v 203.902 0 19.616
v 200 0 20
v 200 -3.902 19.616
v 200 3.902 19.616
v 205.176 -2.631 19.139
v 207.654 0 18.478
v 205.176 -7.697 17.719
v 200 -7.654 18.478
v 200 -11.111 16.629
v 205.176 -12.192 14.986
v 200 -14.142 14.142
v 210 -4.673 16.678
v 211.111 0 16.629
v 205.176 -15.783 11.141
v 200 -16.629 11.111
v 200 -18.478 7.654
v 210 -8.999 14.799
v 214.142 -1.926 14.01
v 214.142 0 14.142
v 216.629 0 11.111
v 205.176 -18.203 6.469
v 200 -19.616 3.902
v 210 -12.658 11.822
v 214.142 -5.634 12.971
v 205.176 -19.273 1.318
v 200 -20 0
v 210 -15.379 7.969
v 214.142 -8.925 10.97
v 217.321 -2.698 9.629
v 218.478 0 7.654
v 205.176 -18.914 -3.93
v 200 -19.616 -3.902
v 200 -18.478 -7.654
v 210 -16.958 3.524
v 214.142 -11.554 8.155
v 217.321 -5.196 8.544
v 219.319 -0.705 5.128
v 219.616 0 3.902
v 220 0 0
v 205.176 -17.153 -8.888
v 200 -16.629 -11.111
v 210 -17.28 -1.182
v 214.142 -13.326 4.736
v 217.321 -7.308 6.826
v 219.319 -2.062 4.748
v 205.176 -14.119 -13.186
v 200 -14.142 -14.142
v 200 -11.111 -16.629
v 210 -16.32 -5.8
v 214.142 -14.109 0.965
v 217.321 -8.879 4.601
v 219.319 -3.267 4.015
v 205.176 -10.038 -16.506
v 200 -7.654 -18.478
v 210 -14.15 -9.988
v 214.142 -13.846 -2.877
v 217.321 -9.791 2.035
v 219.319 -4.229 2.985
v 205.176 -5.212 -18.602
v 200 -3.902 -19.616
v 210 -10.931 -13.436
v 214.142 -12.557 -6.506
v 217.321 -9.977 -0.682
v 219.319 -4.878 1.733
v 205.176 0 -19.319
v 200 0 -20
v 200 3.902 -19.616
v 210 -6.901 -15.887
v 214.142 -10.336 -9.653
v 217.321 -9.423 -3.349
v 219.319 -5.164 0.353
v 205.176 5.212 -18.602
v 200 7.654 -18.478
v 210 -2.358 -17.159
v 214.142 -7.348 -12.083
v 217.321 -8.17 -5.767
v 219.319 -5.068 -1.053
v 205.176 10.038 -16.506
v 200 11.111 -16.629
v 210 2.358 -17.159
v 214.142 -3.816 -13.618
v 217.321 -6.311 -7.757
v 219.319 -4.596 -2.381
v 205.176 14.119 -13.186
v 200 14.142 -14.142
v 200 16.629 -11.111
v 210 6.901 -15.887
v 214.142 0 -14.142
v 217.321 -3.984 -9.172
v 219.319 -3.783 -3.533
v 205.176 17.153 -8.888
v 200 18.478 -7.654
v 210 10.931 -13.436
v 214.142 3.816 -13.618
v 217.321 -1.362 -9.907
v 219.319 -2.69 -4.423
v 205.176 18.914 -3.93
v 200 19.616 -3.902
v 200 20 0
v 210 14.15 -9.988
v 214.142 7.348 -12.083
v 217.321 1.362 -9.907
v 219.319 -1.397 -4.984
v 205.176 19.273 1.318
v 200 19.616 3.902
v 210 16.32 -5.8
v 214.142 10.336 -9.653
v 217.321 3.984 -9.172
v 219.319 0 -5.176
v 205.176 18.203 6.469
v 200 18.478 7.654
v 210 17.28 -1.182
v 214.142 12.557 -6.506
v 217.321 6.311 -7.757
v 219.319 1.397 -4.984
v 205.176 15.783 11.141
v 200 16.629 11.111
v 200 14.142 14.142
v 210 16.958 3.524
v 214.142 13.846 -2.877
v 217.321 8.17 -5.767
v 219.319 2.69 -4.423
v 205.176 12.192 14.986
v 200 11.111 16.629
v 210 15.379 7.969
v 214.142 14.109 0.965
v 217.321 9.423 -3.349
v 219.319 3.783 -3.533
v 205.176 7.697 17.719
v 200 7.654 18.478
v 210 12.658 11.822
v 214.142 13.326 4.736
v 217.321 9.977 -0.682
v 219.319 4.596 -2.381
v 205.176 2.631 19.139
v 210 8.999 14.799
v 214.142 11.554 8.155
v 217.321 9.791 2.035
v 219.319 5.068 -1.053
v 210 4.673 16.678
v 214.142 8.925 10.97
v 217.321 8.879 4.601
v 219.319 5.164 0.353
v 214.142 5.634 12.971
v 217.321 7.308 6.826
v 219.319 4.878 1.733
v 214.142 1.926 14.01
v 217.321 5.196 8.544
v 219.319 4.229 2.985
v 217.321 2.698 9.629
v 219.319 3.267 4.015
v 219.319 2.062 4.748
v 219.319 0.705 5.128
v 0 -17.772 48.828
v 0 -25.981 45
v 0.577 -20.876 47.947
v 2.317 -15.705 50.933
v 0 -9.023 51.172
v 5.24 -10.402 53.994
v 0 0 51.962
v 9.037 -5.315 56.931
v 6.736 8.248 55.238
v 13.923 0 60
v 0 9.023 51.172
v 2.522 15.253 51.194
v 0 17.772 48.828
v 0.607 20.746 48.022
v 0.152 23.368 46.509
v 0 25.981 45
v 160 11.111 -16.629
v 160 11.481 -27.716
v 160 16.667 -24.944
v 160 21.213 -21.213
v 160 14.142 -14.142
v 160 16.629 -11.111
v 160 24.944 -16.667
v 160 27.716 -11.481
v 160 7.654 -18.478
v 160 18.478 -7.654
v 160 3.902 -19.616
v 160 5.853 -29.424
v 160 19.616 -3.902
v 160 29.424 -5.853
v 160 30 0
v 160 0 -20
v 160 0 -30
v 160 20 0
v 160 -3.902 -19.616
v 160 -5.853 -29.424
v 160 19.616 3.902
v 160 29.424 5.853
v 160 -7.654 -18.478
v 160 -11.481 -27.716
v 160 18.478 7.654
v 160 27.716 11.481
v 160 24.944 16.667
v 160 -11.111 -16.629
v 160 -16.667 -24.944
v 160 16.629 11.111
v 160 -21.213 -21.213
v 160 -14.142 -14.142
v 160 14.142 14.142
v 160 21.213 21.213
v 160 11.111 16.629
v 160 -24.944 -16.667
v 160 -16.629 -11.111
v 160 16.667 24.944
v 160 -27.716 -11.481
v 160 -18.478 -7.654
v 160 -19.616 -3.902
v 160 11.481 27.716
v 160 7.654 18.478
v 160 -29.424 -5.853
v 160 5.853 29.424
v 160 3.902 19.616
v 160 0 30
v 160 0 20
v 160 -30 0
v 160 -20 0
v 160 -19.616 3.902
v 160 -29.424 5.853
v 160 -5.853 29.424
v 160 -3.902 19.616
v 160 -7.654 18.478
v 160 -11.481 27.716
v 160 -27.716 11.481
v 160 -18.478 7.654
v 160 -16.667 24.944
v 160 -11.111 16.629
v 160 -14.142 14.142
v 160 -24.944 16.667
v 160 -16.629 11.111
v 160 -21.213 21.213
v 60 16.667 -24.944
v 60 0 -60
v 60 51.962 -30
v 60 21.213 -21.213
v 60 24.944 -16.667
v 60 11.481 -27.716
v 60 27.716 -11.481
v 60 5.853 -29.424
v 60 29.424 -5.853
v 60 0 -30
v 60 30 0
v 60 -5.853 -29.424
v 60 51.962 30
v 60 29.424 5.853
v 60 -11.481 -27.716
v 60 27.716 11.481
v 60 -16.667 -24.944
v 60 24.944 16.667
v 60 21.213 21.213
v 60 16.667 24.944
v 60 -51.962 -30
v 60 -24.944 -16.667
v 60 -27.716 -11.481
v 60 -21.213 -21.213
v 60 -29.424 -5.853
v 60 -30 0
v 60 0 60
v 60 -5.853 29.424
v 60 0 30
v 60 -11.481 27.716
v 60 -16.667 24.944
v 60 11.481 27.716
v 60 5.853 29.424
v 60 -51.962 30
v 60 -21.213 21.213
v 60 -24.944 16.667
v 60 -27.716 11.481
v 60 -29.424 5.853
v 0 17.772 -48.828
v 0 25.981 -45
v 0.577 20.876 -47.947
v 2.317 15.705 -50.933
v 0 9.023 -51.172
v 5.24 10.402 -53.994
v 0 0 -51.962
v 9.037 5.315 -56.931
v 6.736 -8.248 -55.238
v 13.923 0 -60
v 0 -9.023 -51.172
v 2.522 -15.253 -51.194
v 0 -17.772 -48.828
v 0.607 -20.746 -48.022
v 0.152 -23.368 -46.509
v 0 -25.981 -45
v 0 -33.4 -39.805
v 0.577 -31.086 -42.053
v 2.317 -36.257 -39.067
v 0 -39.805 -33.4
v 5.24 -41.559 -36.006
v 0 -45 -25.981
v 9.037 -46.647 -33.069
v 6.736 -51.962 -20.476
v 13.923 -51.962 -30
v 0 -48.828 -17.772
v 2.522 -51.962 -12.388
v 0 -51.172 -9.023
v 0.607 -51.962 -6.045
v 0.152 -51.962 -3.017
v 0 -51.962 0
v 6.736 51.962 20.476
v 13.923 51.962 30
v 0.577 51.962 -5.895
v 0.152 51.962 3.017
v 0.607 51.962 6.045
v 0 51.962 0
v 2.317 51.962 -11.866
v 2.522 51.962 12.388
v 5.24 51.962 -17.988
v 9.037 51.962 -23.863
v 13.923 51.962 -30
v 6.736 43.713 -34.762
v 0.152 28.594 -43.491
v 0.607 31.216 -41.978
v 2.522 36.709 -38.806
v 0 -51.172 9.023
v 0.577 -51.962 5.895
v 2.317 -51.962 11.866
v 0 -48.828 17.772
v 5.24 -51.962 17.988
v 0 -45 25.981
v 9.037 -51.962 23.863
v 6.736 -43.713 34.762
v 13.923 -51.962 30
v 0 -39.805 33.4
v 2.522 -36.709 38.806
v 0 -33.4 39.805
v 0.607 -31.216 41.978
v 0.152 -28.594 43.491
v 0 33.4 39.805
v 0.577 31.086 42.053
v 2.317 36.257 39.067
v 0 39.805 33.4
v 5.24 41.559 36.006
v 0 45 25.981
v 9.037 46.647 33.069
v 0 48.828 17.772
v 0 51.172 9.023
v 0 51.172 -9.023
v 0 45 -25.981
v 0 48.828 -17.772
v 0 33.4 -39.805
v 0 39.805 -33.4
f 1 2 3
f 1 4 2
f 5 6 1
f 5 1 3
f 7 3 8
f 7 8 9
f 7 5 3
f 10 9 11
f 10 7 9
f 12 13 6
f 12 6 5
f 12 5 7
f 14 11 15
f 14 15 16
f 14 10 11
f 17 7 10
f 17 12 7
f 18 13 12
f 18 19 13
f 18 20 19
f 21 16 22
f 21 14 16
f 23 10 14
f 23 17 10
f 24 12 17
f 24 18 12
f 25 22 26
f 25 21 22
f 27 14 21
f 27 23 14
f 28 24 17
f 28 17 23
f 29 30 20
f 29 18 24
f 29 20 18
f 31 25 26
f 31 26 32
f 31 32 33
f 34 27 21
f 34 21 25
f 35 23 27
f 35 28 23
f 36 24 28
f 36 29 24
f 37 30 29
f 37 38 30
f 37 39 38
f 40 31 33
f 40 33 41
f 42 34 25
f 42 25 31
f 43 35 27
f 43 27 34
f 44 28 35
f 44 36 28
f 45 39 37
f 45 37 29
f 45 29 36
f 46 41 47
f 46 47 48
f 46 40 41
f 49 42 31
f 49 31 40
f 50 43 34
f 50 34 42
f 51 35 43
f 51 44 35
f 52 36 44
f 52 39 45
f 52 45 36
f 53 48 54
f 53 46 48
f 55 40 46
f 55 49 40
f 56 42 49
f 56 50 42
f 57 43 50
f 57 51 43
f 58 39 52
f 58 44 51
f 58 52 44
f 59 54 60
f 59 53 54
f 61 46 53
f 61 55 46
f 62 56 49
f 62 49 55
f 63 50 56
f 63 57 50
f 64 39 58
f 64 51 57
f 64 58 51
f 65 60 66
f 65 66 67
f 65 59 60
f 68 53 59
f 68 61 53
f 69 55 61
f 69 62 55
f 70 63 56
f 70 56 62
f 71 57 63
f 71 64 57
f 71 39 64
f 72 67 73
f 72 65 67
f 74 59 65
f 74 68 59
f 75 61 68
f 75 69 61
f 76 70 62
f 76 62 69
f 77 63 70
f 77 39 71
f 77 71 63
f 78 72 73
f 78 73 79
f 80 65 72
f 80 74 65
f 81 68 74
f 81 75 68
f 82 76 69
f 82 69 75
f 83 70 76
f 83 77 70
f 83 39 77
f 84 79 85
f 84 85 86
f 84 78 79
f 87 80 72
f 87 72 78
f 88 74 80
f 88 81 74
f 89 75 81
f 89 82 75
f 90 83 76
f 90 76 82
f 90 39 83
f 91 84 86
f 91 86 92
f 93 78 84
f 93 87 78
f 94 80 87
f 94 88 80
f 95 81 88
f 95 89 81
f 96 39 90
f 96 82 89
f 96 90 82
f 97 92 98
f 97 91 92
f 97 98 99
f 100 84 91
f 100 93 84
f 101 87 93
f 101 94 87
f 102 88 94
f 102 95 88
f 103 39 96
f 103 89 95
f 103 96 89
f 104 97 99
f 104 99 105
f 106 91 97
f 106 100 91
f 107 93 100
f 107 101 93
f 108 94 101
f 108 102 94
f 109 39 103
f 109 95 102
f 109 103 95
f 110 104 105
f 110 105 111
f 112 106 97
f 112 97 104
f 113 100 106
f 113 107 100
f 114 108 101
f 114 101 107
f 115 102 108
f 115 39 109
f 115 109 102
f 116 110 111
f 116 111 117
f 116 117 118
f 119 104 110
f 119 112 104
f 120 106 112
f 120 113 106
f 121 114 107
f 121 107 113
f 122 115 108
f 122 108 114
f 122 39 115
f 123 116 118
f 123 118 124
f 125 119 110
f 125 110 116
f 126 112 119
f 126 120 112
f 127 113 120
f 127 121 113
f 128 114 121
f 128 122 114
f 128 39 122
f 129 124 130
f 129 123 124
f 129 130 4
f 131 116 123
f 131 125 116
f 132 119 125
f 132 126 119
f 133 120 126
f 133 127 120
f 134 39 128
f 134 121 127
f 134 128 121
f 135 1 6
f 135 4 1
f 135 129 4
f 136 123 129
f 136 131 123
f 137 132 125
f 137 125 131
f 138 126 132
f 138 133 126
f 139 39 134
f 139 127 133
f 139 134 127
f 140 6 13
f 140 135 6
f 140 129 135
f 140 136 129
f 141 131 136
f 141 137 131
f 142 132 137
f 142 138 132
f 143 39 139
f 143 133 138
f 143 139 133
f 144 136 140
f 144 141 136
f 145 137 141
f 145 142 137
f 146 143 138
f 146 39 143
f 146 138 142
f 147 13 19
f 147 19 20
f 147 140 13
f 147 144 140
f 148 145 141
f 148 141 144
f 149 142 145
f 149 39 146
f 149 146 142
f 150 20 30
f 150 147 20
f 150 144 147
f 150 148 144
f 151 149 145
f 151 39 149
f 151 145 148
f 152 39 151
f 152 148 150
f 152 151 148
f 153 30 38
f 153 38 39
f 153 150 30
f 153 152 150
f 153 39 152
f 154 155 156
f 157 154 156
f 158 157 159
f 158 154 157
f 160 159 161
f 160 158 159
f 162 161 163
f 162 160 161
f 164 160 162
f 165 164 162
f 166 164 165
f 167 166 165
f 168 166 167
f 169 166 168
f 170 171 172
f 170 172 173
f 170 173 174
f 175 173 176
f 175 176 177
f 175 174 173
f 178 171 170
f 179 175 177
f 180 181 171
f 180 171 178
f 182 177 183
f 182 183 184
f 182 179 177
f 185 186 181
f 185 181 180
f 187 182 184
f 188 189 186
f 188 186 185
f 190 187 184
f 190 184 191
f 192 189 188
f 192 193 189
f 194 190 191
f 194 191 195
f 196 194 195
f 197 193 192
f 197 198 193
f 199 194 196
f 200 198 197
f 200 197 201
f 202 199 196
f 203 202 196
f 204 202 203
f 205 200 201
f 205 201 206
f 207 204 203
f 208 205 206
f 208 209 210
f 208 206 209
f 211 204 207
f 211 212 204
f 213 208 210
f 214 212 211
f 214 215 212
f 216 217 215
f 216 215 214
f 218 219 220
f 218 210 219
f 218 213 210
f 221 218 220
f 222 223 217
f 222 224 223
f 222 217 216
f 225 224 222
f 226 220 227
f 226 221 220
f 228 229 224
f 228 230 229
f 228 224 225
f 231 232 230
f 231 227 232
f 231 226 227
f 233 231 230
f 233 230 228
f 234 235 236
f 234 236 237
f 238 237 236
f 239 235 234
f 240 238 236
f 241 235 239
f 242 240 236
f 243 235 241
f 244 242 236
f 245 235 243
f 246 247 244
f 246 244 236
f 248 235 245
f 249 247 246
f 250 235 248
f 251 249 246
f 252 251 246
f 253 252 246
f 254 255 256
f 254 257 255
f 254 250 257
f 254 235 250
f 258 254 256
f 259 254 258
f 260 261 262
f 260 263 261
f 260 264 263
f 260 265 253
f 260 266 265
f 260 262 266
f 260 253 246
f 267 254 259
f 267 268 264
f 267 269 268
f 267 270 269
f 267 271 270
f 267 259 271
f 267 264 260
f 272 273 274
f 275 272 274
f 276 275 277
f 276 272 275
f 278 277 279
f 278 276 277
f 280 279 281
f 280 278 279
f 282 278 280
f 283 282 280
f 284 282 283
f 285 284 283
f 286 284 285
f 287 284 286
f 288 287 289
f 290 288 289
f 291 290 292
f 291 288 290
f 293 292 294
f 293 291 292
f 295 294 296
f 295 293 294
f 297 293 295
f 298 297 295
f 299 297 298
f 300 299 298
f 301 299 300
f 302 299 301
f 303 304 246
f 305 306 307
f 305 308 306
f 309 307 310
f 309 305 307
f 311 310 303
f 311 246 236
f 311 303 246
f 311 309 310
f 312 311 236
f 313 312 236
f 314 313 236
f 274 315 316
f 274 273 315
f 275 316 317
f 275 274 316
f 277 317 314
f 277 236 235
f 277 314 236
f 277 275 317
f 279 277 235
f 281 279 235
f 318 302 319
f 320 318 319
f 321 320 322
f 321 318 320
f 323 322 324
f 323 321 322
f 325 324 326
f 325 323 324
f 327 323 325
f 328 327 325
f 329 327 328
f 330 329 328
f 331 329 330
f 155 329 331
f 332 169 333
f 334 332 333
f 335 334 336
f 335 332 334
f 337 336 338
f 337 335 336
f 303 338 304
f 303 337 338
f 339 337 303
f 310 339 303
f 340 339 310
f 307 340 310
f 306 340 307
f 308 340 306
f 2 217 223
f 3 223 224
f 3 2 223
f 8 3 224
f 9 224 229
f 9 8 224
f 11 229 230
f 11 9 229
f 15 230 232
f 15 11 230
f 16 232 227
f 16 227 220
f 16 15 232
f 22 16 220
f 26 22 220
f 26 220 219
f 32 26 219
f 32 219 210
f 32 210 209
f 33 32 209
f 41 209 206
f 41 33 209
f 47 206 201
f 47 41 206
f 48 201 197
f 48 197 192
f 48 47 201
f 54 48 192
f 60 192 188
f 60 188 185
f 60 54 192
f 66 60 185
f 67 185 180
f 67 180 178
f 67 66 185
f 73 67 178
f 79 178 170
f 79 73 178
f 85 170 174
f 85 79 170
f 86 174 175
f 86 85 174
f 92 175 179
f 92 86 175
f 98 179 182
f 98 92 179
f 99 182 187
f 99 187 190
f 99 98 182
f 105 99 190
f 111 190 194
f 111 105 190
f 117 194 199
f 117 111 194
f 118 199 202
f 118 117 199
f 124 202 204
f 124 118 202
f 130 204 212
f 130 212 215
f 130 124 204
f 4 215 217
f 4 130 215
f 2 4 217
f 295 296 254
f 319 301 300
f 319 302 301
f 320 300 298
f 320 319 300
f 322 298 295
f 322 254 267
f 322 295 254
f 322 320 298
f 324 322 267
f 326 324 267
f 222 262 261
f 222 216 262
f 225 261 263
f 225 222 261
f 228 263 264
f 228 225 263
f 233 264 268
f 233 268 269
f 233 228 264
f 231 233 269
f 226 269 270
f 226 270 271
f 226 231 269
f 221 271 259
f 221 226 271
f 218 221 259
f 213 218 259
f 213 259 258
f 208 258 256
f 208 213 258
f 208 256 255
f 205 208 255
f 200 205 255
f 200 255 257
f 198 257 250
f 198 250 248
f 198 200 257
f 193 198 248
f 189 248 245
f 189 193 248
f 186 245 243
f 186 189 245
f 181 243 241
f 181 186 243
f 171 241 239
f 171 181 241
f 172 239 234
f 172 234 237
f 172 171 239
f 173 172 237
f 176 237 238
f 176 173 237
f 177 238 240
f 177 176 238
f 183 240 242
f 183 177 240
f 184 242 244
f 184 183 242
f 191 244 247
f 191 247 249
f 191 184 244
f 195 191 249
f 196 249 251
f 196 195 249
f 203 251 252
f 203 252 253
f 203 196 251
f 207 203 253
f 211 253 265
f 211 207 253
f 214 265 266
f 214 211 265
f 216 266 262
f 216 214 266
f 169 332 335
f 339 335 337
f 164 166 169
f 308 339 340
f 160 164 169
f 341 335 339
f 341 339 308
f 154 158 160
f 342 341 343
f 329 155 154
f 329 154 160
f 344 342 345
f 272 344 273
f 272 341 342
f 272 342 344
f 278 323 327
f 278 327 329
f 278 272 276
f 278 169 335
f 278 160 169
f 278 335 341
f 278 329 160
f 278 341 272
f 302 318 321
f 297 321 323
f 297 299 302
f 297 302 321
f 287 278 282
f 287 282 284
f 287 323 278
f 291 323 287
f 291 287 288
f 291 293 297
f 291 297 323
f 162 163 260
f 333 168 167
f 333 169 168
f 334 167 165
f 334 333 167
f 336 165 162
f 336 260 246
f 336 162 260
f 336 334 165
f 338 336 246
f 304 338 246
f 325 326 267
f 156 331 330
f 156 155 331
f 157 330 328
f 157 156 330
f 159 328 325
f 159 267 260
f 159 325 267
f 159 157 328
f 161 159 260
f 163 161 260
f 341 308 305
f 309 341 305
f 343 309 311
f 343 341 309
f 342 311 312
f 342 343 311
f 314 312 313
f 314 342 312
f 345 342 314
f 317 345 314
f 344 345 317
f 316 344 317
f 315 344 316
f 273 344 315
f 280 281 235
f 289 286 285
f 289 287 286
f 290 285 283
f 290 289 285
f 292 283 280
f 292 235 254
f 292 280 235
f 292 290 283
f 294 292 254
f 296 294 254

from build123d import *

# Parameters (mm, degrees)
DOME1_FACE_RADIUS  = 20
DOME1_HEIGHT       = 20
SKETCH3_OUTSIDE_W  = 177.57
SKETCH3_OUTSIDE_H  = 177.57
CUT_EXTRUDE4_DEPTH = 236.796522451
SKETCH5_OUTSIDE_W  = 447.476
SKETCH5_OUTSIDE_H  = 431.4
SKETCH5_OUTSIDE_R  = 51.961524227
CUT_EXTRUDE5_DEPTH = 234.880311271
CUT_EXTRUDE5_DRAFT = -30


with BuildPart() as part:
    # Sketch1 → Revolve2 (revolve)
    with BuildSketch(Plane(origin=(0, 0, 0), x_dir=(1, 0, 0), z_dir=(0, 1, 0)), mode=Mode.PRIVATE) as revolve2_sk:
        Polygon((0, 0), (0, 60), (60, 60), (60, 30), (160, 30), (160, 20), (200, 20), (200, 0), align=None)
    revolve(revolve2_sk.sketch.rotate(Axis((0, 0, 0), (1, 0, 0)), 180), axis=Axis((0, 0, 0), (1, 0, 0)))

    # Dome1: a dome of height H over a round flat face of radius A is a cap of a sphere of radius (A * A + H * H) / (2 * H)
    dome1_r = (DOME1_FACE_RADIUS * DOME1_FACE_RADIUS + DOME1_HEIGHT * DOME1_HEIGHT) / (2 * DOME1_HEIGHT)
    dome1_base = Plane((200, 0, 0), z_dir=(1, 0, 0))
    with Locations(dome1_base.offset(DOME1_HEIGHT - dome1_r)):
        dome1_ball = Sphere(dome1_r, mode=Mode.PRIVATE)
    add(split(dome1_ball, bisect_by=dome1_base, keep=Keep.TOP, mode=Mode.PRIVATE))

    # Sketch3 outside → Cut-Extrude4 (cut, through all)
    with BuildSketch(Plane.ZY):
        Rectangle(SKETCH3_OUTSIDE_W, SKETCH3_OUTSIDE_H)
        Polygon((60, 0), (30, 51.961524227), (-30, 51.961524227), (-60, 0), (-30, -51.961524227), (30, -51.961524227), align=None, mode=Mode.SUBTRACT)
    extrude(amount=-CUT_EXTRUDE4_DEPTH, mode=Mode.SUBTRACT)


with BuildPart() as cut_extrude5_tool:
    # Sketch5 outside → Cut-Extrude5 (with draft: the straight prism first)
    with BuildSketch(Plane.ZY):
        Rectangle(SKETCH5_OUTSIDE_W, SKETCH5_OUTSIDE_H)
        Circle(SKETCH5_OUTSIDE_R, mode=Mode.SUBTRACT)
    extrude(amount=-CUT_EXTRUDE5_DEPTH)
    # Cut-Extrude5: the draft: its side faces are tilted about the plane it starts from
    cut_extrude5_sides = [cut_extrude5_tool.faces().sort_by_distance(p)[0] for p in [
        (117.440155635, -215.7, 0),
        (117.440155635, 0, 223.738),
        (117.440155635, 215.7, 0),
        (117.440155635, 0, -223.738),
        (117.440155635, 0, -51.961524227),
    ]]
    draft(cut_extrude5_sides, Plane.ZY, CUT_EXTRUDE5_DRAFT)


with BuildPart() as part_1:
    add(part.part)

    # Cut-Extrude5: cut by cut_extrude5_tool
    add(cut_extrude5_tool.part, mode=Mode.SUBTRACT)


solid = part_1.part
